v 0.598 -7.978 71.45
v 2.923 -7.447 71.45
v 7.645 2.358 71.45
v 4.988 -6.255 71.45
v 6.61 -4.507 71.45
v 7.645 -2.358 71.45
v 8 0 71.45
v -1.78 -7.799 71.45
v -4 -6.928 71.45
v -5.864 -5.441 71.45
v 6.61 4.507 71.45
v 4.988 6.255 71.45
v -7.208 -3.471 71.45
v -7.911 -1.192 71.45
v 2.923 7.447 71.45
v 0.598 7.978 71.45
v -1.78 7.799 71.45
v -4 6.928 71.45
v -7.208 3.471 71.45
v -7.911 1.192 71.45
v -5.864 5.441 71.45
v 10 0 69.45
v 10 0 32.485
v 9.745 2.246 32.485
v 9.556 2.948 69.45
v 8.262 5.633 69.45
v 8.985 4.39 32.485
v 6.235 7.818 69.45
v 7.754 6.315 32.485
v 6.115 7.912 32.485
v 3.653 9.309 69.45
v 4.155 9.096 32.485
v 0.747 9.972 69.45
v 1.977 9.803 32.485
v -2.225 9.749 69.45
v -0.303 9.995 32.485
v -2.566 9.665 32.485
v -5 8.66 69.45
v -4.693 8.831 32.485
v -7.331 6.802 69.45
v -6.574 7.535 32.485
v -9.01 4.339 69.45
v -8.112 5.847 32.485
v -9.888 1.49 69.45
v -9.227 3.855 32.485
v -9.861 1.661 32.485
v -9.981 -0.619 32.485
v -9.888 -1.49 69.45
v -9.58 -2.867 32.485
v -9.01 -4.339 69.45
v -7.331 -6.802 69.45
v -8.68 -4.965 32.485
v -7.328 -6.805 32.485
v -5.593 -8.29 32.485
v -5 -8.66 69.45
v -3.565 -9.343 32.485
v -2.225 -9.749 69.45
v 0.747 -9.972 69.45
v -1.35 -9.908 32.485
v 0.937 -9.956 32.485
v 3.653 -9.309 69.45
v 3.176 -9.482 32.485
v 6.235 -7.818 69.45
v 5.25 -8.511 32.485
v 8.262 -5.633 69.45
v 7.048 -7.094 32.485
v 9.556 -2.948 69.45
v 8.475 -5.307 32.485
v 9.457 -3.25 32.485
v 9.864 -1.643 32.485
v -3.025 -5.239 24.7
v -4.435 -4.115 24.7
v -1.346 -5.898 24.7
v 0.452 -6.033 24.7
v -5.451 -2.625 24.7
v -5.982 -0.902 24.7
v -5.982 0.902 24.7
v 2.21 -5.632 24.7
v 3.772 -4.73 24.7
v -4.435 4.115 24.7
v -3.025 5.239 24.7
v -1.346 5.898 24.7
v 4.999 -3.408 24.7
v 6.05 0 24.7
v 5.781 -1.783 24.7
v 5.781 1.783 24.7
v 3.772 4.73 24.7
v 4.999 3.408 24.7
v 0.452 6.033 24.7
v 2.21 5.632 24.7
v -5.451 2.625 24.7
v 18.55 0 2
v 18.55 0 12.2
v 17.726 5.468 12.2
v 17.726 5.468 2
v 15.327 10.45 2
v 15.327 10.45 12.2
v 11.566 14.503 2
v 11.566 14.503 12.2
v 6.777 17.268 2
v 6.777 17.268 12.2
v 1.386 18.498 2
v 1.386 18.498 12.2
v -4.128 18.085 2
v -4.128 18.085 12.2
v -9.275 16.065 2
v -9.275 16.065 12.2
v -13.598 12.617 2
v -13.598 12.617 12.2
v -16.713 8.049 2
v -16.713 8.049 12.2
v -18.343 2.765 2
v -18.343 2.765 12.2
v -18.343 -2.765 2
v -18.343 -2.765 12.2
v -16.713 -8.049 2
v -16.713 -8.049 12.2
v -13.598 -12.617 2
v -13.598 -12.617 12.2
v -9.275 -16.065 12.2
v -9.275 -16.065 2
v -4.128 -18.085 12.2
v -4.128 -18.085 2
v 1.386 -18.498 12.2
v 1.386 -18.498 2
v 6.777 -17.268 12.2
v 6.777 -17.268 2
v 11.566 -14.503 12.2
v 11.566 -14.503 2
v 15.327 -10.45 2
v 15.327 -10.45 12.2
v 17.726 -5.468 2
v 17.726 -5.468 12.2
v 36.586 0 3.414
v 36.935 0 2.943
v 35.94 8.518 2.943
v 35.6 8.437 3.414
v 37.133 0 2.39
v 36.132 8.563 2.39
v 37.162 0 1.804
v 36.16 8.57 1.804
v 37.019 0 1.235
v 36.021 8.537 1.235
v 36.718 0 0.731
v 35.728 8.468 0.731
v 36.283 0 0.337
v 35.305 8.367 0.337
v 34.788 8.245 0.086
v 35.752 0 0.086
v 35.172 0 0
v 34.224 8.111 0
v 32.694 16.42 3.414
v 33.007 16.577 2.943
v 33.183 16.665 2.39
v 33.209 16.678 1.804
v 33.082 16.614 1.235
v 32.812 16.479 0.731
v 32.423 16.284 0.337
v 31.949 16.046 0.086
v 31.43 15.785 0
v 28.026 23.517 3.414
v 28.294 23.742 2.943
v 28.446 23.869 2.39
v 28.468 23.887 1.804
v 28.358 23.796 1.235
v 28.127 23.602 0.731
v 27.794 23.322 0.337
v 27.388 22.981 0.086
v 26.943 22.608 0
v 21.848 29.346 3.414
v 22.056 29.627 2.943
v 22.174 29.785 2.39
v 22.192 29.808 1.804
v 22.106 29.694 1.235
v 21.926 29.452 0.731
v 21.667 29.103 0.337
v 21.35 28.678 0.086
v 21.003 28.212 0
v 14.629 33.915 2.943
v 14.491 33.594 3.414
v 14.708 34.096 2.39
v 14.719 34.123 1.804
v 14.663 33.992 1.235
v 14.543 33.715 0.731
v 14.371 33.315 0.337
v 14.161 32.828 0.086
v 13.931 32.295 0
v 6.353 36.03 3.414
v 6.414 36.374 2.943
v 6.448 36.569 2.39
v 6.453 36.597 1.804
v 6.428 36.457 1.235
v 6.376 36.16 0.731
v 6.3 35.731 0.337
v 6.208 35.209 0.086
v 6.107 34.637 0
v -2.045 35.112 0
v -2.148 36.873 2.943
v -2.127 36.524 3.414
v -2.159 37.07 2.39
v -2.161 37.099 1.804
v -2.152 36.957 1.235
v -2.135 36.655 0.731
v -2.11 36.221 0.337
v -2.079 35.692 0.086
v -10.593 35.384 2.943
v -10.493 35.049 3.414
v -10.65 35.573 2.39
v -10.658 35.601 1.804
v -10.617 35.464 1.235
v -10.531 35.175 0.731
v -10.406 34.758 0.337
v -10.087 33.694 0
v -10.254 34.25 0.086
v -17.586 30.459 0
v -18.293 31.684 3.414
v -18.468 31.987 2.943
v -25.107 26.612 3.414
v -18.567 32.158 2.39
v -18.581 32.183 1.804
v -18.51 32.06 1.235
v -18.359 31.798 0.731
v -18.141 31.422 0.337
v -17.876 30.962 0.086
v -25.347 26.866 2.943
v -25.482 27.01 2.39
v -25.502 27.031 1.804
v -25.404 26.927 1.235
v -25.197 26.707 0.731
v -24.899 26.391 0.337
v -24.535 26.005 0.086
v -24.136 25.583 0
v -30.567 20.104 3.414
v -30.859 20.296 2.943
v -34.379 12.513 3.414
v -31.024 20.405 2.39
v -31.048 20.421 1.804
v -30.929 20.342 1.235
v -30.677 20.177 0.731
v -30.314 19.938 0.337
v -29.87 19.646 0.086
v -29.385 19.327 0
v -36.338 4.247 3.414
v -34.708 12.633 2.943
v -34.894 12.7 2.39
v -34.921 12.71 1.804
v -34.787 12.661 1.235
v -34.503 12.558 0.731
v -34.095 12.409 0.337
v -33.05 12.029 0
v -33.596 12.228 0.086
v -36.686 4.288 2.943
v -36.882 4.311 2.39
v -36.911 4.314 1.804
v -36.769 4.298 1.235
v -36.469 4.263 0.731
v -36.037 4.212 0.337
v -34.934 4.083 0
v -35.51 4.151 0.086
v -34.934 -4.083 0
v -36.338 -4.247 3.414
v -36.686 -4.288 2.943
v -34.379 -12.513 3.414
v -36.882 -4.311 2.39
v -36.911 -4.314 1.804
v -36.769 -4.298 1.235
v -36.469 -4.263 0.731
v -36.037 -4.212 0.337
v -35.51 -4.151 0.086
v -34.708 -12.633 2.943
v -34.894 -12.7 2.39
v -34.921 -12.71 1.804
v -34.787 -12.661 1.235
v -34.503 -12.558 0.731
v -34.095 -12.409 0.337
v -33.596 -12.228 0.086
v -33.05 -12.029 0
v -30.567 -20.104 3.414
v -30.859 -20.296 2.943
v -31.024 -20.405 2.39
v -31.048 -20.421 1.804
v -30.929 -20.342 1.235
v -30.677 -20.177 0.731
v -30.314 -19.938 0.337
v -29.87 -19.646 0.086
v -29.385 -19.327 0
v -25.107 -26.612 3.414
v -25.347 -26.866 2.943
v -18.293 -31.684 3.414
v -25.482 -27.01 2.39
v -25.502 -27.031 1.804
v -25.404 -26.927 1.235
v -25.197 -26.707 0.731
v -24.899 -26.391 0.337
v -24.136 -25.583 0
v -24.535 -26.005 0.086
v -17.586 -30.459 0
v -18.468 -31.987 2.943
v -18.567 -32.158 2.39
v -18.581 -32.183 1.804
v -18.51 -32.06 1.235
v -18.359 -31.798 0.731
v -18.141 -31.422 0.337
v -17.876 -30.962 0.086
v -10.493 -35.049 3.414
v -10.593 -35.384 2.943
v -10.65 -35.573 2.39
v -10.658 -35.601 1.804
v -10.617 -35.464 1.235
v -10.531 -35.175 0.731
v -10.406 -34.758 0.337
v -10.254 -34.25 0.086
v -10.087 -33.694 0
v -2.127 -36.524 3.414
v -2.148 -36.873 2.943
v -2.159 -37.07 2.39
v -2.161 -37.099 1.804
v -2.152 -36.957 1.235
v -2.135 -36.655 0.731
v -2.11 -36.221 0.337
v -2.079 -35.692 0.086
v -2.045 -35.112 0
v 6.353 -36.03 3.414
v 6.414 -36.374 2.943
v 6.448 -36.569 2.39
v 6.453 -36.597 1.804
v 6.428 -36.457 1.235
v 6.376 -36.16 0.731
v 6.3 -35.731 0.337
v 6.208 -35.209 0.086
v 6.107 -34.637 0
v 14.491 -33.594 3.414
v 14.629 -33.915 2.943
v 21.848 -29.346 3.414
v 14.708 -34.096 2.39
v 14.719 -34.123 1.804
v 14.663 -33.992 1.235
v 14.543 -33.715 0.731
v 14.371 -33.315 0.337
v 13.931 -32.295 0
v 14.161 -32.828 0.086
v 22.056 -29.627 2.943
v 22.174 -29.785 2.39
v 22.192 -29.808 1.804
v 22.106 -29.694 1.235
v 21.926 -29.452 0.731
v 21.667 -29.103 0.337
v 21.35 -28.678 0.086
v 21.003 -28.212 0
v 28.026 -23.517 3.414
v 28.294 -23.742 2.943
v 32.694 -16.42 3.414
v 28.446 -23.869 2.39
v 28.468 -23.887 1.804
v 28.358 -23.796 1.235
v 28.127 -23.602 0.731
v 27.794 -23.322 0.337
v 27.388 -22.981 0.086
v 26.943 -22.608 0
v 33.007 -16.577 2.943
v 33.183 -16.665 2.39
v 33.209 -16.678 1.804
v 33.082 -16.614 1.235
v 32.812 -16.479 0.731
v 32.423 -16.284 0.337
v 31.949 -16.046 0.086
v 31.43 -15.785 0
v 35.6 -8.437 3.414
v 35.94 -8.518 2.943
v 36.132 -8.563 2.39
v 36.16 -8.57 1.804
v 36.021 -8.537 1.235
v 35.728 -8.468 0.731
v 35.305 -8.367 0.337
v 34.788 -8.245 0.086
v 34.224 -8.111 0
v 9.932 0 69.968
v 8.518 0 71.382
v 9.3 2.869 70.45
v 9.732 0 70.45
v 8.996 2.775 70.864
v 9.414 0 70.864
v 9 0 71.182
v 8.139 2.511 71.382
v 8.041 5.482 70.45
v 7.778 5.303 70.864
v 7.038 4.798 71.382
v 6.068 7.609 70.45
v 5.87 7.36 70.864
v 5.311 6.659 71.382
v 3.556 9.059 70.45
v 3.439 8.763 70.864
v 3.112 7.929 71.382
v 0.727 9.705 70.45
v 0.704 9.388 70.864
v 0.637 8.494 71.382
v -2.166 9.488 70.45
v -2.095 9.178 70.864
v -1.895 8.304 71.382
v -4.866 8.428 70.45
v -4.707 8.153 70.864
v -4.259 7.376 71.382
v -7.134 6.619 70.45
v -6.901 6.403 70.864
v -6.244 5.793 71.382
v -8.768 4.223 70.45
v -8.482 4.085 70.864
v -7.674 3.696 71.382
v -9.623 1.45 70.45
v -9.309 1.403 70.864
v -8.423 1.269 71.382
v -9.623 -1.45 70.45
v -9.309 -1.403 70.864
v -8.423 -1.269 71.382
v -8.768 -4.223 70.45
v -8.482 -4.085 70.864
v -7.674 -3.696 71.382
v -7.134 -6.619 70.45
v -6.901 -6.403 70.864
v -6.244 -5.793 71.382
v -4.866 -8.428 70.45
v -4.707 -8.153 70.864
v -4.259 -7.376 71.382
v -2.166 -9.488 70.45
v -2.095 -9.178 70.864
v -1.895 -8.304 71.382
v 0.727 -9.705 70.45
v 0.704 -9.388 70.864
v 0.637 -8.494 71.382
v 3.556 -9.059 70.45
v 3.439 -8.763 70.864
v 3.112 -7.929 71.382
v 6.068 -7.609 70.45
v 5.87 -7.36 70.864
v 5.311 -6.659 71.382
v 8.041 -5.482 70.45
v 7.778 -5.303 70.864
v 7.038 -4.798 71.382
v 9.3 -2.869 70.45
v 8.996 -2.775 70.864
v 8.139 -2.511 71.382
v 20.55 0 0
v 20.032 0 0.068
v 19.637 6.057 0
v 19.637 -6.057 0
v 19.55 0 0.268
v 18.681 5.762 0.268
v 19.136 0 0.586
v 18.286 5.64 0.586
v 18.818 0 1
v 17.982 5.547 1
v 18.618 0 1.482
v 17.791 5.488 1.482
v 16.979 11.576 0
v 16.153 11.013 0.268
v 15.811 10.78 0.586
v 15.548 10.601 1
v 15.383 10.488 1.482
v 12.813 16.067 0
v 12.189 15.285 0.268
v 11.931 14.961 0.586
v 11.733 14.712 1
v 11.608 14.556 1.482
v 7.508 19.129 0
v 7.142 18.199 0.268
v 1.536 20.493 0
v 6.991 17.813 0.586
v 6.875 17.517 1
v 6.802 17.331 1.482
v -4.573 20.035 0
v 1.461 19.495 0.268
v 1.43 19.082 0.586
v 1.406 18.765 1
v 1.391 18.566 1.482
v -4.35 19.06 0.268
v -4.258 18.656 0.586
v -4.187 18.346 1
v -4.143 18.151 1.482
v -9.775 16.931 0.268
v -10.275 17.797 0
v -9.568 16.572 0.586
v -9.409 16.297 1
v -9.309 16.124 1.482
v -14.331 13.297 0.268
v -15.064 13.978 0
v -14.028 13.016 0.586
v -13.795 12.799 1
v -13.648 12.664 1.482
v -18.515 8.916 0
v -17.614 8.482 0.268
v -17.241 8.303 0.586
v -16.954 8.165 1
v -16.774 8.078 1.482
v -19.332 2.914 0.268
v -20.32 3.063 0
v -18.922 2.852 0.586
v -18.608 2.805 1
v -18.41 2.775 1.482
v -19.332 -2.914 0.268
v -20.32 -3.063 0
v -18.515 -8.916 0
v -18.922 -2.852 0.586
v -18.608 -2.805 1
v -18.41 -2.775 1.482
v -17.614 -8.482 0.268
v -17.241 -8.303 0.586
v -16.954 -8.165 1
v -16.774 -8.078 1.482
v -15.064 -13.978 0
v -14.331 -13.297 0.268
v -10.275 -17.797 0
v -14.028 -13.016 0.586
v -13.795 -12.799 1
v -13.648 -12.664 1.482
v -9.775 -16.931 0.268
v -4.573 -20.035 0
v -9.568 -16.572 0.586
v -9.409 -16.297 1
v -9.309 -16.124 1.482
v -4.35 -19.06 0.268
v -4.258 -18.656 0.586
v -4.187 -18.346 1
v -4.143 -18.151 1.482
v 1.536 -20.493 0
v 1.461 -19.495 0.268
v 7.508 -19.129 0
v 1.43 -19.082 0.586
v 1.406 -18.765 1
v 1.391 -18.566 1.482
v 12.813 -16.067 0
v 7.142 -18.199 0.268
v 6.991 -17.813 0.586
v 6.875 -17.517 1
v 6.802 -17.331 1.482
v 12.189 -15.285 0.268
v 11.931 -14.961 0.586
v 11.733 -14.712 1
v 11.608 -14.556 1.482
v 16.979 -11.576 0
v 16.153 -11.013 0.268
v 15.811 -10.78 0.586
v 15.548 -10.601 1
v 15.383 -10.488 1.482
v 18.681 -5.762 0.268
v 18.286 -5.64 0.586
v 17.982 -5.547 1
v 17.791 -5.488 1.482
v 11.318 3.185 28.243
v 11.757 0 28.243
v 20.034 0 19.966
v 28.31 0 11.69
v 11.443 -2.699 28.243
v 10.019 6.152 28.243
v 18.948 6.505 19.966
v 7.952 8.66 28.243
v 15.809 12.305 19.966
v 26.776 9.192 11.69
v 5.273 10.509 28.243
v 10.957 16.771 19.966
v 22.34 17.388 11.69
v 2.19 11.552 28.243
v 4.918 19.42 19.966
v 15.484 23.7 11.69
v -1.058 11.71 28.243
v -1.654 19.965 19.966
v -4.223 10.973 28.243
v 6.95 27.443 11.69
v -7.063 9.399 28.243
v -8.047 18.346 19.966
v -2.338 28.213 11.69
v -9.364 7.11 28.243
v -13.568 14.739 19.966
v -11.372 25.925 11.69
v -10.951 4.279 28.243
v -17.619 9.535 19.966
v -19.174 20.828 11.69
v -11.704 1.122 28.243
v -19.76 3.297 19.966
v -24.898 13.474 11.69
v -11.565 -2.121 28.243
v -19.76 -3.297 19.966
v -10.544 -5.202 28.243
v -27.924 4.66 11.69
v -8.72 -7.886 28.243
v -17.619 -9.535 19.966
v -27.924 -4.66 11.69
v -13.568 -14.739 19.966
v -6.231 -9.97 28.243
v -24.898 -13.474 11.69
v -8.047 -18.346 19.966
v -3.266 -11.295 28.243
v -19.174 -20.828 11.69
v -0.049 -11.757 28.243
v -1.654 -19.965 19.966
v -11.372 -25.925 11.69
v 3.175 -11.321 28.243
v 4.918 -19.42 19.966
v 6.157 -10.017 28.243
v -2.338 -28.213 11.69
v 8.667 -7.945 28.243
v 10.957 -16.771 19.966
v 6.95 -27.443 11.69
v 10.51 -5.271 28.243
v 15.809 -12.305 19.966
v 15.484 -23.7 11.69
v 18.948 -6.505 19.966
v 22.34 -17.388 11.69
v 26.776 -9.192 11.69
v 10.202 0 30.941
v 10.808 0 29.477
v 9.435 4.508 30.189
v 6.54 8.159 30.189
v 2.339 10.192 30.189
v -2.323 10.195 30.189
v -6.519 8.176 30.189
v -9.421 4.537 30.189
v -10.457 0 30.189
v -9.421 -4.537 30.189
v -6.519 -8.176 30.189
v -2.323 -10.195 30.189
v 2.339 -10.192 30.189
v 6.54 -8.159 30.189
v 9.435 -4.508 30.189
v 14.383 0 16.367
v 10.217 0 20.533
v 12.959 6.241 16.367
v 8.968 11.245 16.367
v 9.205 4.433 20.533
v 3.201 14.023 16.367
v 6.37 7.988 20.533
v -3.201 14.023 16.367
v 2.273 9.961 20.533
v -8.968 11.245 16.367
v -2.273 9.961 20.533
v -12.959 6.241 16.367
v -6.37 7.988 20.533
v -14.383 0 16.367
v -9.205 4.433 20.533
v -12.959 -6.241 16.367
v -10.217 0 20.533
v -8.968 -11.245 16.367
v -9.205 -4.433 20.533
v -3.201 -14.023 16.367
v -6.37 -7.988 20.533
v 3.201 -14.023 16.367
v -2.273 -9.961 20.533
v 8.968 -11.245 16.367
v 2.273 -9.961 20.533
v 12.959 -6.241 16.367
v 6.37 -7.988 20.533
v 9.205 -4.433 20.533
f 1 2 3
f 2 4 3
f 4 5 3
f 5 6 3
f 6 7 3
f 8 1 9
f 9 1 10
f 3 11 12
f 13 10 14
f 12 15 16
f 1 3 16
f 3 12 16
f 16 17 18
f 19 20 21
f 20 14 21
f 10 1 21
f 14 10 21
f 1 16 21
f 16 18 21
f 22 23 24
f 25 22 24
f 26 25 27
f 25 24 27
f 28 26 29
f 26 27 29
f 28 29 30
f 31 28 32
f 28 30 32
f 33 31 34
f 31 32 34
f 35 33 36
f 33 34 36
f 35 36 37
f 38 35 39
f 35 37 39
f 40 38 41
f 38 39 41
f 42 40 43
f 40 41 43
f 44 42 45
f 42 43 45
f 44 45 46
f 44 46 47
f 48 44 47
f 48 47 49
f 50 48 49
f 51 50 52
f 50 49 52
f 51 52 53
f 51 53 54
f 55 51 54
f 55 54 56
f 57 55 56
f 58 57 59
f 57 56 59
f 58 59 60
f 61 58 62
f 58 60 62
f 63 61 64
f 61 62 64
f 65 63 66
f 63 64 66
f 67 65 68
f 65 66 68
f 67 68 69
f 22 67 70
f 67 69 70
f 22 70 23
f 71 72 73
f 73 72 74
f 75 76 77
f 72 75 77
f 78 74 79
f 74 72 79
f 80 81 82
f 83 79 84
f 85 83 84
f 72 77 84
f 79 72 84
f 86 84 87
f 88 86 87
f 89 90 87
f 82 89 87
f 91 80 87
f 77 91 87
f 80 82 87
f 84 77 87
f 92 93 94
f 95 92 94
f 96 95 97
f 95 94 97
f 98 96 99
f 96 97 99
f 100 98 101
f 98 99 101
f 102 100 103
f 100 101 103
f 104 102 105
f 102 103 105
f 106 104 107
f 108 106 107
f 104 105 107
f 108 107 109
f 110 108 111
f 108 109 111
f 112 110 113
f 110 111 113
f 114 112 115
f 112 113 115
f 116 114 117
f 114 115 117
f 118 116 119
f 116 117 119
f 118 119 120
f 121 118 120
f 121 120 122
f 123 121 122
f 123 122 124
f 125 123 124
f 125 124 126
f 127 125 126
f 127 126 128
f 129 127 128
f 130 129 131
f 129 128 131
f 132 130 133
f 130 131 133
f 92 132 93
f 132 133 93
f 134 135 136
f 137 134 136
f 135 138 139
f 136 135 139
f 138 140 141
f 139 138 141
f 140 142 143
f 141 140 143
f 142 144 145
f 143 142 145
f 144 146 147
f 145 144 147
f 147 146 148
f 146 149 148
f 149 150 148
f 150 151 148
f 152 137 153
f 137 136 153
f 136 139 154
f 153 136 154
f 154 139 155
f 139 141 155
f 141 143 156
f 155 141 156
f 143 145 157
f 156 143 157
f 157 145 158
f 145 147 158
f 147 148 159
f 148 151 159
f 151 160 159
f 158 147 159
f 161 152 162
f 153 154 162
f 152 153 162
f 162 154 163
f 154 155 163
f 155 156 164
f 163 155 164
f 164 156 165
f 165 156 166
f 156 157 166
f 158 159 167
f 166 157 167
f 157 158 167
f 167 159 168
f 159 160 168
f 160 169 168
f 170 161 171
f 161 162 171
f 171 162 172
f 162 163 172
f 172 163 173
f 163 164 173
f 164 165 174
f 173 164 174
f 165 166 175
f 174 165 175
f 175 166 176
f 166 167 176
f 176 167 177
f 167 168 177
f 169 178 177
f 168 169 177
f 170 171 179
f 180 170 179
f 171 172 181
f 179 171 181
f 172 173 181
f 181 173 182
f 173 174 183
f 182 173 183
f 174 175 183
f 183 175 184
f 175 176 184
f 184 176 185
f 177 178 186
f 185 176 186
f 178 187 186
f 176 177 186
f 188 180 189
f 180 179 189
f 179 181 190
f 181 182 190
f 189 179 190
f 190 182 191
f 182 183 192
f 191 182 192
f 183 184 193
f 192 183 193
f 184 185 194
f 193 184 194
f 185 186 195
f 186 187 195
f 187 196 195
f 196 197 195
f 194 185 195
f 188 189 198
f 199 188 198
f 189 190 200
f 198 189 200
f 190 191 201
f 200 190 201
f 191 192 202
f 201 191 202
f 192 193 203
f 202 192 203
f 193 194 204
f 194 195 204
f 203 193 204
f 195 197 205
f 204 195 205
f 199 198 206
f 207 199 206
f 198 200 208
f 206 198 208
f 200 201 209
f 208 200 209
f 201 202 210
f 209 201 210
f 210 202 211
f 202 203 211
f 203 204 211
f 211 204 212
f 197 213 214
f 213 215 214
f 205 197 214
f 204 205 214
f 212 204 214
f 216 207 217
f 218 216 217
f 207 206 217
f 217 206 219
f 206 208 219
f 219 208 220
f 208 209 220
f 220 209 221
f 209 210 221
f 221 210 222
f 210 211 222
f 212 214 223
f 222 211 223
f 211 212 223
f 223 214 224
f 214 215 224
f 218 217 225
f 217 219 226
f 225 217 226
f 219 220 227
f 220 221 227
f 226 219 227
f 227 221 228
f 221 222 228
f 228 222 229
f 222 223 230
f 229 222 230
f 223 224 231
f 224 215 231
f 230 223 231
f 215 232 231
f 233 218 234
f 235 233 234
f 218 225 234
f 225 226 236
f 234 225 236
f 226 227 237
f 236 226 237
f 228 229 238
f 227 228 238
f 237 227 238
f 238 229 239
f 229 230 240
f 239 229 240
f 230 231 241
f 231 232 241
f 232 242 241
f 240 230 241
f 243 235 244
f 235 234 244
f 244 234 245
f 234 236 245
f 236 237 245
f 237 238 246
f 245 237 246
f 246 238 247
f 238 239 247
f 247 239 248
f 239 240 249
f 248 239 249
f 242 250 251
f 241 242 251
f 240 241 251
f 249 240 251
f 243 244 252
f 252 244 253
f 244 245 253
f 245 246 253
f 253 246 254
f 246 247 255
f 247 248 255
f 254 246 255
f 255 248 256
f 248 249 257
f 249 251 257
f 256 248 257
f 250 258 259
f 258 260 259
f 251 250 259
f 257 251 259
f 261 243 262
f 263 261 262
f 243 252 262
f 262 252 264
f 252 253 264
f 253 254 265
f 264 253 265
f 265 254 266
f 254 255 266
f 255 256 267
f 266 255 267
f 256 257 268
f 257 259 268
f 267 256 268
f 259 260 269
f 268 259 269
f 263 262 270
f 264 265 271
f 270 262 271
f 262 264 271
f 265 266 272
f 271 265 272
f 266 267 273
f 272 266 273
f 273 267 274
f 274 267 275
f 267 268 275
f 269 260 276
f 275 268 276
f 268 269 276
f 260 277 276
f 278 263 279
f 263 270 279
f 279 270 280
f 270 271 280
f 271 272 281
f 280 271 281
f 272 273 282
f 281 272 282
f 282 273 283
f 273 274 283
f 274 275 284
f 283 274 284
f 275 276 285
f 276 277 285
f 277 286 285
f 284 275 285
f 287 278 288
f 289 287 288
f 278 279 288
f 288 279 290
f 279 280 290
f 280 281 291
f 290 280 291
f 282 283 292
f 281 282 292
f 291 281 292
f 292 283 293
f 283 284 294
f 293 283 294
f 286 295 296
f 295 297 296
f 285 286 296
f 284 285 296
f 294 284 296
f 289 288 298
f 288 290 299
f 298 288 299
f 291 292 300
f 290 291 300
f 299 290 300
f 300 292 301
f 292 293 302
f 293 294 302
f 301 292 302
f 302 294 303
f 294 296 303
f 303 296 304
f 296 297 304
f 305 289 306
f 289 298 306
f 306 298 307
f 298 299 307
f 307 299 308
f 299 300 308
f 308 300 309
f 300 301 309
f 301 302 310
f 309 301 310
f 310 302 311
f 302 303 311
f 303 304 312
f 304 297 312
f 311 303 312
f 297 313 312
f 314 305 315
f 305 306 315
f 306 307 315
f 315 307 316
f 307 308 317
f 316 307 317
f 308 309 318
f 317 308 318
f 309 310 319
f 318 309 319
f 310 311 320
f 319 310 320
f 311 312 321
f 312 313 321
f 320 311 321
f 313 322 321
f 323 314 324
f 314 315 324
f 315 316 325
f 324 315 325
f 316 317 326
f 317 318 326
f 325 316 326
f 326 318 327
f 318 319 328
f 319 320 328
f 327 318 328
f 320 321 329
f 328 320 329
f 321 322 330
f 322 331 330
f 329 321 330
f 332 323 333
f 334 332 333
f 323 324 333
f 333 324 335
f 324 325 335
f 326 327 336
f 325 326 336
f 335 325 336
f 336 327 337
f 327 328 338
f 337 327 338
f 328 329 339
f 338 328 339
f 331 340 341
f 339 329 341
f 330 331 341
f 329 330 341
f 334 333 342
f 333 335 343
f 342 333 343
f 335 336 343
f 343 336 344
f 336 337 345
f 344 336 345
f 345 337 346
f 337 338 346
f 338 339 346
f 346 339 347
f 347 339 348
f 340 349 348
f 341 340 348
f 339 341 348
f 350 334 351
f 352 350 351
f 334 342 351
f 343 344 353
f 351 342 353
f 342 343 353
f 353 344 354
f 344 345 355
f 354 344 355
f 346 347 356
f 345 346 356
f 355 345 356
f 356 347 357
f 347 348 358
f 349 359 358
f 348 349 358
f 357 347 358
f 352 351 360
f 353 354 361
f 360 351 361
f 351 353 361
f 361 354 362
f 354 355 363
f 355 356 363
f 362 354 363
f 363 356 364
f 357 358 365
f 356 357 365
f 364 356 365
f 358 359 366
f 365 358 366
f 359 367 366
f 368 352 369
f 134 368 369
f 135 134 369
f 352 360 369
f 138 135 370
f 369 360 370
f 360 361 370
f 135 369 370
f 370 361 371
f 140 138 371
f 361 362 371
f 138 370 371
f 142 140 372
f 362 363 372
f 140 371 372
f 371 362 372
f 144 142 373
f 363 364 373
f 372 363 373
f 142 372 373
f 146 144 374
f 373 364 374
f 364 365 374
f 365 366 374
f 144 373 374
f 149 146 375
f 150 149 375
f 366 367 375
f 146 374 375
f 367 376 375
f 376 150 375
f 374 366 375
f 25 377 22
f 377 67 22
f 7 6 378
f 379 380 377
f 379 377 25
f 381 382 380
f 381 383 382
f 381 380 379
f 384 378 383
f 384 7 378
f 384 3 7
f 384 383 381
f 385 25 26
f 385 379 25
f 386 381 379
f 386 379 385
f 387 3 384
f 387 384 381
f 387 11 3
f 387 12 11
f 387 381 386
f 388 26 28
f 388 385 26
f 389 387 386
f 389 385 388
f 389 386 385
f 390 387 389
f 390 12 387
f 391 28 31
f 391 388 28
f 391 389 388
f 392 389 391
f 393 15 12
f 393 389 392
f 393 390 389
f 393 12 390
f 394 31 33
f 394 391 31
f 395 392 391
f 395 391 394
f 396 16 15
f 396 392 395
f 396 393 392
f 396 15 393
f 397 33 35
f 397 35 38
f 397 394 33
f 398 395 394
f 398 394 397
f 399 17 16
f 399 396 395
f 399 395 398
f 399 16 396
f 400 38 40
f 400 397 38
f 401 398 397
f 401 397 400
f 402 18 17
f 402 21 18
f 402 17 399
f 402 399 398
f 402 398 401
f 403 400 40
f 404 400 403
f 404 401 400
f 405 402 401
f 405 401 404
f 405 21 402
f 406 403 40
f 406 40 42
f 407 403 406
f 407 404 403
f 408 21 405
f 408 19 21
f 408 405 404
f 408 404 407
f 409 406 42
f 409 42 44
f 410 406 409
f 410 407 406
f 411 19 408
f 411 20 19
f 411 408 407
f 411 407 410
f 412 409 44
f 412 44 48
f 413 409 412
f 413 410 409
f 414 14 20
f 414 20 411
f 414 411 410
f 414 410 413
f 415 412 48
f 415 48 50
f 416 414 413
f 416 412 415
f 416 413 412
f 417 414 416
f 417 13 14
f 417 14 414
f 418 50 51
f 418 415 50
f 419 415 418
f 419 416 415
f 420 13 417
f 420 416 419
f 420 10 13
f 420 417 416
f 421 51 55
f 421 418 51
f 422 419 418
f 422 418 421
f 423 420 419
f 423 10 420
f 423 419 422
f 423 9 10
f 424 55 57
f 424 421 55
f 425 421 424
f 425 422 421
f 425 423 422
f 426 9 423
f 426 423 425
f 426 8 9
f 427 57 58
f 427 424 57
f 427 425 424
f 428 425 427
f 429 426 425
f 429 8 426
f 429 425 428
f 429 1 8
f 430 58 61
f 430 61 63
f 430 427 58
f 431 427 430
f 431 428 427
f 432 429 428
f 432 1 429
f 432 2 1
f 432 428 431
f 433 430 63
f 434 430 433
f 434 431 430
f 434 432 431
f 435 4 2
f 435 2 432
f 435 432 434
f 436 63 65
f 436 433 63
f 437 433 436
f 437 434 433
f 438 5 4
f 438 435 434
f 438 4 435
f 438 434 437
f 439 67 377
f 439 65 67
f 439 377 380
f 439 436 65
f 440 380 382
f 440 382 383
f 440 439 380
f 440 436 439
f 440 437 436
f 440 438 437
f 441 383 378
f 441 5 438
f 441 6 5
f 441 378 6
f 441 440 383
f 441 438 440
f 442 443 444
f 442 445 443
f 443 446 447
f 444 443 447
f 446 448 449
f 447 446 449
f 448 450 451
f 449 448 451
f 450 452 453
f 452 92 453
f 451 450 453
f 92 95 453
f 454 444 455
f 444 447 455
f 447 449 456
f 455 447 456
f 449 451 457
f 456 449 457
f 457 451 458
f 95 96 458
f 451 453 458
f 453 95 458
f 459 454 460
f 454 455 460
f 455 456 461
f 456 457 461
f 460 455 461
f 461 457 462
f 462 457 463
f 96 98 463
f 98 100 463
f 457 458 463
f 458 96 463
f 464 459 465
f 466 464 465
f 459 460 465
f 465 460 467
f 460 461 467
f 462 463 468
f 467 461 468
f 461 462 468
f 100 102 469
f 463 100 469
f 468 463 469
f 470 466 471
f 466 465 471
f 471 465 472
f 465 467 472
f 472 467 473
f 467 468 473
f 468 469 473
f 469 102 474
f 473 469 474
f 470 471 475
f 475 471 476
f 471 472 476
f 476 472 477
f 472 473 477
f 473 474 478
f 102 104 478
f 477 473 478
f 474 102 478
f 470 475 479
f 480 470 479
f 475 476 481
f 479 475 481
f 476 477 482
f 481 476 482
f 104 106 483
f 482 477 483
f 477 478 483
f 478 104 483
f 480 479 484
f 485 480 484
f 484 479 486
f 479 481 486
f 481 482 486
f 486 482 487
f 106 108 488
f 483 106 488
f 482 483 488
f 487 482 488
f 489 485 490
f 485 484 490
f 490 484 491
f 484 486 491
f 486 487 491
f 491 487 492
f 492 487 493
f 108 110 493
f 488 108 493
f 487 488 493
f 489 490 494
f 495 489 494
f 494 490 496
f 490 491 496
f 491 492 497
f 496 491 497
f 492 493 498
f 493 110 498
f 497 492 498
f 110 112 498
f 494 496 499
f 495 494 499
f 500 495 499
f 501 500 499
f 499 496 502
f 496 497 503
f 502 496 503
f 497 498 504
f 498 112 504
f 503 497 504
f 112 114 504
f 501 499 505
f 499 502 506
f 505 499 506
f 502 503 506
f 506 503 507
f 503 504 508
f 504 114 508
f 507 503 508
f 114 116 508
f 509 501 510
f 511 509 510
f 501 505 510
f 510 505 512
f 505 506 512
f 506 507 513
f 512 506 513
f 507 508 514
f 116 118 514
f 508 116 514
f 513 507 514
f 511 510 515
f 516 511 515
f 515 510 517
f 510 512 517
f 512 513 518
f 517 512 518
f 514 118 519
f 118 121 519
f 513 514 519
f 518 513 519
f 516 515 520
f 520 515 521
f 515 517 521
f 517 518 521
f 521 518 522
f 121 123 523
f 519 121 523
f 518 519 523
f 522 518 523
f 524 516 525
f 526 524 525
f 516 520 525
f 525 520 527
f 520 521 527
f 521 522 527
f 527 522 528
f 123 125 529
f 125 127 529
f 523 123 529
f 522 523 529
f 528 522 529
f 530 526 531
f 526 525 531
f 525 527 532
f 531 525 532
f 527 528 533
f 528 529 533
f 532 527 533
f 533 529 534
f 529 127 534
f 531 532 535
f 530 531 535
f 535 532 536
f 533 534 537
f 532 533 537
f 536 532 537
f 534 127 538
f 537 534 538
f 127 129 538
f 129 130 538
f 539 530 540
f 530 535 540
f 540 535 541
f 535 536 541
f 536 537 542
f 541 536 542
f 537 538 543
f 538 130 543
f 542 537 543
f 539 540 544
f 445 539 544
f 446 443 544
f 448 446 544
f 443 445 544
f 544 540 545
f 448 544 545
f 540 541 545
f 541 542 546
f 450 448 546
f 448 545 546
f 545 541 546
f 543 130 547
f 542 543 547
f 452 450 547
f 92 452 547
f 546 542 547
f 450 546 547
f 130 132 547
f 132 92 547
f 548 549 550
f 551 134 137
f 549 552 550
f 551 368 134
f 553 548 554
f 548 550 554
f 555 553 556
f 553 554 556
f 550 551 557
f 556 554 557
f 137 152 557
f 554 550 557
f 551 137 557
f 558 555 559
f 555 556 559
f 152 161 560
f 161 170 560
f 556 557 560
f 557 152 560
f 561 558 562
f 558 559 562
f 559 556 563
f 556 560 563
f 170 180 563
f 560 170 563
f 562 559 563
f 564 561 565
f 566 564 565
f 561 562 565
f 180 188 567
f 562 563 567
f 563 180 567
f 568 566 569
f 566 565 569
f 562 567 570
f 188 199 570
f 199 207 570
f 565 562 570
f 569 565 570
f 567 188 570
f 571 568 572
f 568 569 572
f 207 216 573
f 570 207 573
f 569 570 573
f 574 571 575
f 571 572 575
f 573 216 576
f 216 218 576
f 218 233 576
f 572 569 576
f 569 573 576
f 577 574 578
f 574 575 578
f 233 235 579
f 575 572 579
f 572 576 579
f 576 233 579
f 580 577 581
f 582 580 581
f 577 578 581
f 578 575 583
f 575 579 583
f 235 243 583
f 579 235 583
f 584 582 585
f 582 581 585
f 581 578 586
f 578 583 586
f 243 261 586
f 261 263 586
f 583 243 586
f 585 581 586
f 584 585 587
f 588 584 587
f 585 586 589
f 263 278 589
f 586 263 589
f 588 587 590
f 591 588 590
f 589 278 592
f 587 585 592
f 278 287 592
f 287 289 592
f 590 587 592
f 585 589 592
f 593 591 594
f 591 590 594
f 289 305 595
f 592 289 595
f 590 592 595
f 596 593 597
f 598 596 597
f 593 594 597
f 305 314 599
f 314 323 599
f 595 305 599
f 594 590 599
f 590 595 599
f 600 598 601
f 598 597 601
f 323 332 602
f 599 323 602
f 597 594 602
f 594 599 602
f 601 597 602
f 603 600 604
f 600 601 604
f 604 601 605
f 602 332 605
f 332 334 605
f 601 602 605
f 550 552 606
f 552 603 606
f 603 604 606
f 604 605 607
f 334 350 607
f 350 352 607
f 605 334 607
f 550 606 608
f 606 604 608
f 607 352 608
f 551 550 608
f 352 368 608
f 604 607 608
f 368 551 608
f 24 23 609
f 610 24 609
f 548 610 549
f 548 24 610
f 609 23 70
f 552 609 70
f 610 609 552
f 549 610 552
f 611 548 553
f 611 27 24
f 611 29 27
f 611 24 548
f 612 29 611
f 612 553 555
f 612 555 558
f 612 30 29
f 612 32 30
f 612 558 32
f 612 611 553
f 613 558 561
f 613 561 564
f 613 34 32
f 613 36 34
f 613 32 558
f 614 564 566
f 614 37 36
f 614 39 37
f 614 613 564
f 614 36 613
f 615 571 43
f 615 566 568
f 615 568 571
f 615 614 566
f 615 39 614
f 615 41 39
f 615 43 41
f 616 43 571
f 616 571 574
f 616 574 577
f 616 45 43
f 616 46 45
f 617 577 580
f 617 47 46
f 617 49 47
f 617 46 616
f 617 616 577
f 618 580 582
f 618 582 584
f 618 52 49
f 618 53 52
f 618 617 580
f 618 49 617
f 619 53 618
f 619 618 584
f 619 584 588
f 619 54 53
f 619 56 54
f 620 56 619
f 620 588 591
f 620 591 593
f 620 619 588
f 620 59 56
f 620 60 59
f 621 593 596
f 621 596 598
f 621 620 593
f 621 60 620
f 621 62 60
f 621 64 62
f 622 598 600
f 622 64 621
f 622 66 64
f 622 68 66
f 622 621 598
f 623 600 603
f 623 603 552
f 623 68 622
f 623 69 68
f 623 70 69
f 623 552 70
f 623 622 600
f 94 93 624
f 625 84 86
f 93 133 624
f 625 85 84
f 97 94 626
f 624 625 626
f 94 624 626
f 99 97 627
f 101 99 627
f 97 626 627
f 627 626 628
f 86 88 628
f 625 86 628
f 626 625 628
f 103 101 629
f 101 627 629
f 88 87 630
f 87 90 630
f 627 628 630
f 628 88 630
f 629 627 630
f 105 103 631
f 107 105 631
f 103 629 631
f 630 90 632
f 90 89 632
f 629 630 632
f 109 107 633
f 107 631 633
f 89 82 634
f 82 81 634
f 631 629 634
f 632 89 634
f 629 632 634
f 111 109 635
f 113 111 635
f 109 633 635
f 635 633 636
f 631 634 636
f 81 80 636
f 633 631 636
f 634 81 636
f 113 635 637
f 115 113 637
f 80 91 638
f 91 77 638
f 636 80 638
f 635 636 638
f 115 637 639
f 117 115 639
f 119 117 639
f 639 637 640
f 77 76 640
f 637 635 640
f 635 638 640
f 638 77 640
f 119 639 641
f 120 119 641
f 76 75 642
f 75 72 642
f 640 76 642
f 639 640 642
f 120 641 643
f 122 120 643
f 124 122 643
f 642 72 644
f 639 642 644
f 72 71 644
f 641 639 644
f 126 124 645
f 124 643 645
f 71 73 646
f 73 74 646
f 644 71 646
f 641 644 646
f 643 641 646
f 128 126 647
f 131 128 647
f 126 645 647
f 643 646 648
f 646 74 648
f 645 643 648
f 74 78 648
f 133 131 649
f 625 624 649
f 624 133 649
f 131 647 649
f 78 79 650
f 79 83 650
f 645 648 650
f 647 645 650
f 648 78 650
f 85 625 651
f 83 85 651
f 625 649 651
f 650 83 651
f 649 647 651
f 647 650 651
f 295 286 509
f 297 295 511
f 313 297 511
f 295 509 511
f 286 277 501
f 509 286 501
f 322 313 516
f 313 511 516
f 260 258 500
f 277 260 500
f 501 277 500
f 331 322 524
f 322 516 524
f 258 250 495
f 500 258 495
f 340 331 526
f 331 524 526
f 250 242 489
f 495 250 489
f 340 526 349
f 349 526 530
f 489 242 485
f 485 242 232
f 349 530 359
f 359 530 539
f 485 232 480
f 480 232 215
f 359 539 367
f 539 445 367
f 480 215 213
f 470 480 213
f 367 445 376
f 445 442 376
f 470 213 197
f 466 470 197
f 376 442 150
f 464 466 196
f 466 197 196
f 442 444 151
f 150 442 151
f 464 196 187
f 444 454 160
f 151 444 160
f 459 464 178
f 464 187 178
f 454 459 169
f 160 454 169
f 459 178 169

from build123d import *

# Parameters (mm, degrees)
FILLET001_R = 6
FILLET003_R = 2


with BuildPart() as part:
    # Sketch → Revolution (revolve)
    with BuildSketch(Plane.XZ):
        Polygon((18.55, 0), (18.55, 12.2), (6.05, 24.7), (0, 24.7), (0, 71.45), (10, 71.45), (10, 30), (40, 0), align=None)
    revolve(axis=Axis((0, 0, 0), (0, 0, 1)))

    # Fillet001
    fillet001_edges = [part.edges().sort_by_distance(p)[0] for p in [
        (-10, 0, 30),
    ]]
    fillet(fillet001_edges, radius=FILLET001_R)

    # Fillet003
    fillet003_edges = [part.edges().sort_by_distance(p)[0] for p in [
        (-10, 0, 71.45),
        (-18.55, 0, 0),
        (-40, 0, 0),
    ]]
    fillet(fillet003_edges, radius=FILLET003_R)


solid = part.part
